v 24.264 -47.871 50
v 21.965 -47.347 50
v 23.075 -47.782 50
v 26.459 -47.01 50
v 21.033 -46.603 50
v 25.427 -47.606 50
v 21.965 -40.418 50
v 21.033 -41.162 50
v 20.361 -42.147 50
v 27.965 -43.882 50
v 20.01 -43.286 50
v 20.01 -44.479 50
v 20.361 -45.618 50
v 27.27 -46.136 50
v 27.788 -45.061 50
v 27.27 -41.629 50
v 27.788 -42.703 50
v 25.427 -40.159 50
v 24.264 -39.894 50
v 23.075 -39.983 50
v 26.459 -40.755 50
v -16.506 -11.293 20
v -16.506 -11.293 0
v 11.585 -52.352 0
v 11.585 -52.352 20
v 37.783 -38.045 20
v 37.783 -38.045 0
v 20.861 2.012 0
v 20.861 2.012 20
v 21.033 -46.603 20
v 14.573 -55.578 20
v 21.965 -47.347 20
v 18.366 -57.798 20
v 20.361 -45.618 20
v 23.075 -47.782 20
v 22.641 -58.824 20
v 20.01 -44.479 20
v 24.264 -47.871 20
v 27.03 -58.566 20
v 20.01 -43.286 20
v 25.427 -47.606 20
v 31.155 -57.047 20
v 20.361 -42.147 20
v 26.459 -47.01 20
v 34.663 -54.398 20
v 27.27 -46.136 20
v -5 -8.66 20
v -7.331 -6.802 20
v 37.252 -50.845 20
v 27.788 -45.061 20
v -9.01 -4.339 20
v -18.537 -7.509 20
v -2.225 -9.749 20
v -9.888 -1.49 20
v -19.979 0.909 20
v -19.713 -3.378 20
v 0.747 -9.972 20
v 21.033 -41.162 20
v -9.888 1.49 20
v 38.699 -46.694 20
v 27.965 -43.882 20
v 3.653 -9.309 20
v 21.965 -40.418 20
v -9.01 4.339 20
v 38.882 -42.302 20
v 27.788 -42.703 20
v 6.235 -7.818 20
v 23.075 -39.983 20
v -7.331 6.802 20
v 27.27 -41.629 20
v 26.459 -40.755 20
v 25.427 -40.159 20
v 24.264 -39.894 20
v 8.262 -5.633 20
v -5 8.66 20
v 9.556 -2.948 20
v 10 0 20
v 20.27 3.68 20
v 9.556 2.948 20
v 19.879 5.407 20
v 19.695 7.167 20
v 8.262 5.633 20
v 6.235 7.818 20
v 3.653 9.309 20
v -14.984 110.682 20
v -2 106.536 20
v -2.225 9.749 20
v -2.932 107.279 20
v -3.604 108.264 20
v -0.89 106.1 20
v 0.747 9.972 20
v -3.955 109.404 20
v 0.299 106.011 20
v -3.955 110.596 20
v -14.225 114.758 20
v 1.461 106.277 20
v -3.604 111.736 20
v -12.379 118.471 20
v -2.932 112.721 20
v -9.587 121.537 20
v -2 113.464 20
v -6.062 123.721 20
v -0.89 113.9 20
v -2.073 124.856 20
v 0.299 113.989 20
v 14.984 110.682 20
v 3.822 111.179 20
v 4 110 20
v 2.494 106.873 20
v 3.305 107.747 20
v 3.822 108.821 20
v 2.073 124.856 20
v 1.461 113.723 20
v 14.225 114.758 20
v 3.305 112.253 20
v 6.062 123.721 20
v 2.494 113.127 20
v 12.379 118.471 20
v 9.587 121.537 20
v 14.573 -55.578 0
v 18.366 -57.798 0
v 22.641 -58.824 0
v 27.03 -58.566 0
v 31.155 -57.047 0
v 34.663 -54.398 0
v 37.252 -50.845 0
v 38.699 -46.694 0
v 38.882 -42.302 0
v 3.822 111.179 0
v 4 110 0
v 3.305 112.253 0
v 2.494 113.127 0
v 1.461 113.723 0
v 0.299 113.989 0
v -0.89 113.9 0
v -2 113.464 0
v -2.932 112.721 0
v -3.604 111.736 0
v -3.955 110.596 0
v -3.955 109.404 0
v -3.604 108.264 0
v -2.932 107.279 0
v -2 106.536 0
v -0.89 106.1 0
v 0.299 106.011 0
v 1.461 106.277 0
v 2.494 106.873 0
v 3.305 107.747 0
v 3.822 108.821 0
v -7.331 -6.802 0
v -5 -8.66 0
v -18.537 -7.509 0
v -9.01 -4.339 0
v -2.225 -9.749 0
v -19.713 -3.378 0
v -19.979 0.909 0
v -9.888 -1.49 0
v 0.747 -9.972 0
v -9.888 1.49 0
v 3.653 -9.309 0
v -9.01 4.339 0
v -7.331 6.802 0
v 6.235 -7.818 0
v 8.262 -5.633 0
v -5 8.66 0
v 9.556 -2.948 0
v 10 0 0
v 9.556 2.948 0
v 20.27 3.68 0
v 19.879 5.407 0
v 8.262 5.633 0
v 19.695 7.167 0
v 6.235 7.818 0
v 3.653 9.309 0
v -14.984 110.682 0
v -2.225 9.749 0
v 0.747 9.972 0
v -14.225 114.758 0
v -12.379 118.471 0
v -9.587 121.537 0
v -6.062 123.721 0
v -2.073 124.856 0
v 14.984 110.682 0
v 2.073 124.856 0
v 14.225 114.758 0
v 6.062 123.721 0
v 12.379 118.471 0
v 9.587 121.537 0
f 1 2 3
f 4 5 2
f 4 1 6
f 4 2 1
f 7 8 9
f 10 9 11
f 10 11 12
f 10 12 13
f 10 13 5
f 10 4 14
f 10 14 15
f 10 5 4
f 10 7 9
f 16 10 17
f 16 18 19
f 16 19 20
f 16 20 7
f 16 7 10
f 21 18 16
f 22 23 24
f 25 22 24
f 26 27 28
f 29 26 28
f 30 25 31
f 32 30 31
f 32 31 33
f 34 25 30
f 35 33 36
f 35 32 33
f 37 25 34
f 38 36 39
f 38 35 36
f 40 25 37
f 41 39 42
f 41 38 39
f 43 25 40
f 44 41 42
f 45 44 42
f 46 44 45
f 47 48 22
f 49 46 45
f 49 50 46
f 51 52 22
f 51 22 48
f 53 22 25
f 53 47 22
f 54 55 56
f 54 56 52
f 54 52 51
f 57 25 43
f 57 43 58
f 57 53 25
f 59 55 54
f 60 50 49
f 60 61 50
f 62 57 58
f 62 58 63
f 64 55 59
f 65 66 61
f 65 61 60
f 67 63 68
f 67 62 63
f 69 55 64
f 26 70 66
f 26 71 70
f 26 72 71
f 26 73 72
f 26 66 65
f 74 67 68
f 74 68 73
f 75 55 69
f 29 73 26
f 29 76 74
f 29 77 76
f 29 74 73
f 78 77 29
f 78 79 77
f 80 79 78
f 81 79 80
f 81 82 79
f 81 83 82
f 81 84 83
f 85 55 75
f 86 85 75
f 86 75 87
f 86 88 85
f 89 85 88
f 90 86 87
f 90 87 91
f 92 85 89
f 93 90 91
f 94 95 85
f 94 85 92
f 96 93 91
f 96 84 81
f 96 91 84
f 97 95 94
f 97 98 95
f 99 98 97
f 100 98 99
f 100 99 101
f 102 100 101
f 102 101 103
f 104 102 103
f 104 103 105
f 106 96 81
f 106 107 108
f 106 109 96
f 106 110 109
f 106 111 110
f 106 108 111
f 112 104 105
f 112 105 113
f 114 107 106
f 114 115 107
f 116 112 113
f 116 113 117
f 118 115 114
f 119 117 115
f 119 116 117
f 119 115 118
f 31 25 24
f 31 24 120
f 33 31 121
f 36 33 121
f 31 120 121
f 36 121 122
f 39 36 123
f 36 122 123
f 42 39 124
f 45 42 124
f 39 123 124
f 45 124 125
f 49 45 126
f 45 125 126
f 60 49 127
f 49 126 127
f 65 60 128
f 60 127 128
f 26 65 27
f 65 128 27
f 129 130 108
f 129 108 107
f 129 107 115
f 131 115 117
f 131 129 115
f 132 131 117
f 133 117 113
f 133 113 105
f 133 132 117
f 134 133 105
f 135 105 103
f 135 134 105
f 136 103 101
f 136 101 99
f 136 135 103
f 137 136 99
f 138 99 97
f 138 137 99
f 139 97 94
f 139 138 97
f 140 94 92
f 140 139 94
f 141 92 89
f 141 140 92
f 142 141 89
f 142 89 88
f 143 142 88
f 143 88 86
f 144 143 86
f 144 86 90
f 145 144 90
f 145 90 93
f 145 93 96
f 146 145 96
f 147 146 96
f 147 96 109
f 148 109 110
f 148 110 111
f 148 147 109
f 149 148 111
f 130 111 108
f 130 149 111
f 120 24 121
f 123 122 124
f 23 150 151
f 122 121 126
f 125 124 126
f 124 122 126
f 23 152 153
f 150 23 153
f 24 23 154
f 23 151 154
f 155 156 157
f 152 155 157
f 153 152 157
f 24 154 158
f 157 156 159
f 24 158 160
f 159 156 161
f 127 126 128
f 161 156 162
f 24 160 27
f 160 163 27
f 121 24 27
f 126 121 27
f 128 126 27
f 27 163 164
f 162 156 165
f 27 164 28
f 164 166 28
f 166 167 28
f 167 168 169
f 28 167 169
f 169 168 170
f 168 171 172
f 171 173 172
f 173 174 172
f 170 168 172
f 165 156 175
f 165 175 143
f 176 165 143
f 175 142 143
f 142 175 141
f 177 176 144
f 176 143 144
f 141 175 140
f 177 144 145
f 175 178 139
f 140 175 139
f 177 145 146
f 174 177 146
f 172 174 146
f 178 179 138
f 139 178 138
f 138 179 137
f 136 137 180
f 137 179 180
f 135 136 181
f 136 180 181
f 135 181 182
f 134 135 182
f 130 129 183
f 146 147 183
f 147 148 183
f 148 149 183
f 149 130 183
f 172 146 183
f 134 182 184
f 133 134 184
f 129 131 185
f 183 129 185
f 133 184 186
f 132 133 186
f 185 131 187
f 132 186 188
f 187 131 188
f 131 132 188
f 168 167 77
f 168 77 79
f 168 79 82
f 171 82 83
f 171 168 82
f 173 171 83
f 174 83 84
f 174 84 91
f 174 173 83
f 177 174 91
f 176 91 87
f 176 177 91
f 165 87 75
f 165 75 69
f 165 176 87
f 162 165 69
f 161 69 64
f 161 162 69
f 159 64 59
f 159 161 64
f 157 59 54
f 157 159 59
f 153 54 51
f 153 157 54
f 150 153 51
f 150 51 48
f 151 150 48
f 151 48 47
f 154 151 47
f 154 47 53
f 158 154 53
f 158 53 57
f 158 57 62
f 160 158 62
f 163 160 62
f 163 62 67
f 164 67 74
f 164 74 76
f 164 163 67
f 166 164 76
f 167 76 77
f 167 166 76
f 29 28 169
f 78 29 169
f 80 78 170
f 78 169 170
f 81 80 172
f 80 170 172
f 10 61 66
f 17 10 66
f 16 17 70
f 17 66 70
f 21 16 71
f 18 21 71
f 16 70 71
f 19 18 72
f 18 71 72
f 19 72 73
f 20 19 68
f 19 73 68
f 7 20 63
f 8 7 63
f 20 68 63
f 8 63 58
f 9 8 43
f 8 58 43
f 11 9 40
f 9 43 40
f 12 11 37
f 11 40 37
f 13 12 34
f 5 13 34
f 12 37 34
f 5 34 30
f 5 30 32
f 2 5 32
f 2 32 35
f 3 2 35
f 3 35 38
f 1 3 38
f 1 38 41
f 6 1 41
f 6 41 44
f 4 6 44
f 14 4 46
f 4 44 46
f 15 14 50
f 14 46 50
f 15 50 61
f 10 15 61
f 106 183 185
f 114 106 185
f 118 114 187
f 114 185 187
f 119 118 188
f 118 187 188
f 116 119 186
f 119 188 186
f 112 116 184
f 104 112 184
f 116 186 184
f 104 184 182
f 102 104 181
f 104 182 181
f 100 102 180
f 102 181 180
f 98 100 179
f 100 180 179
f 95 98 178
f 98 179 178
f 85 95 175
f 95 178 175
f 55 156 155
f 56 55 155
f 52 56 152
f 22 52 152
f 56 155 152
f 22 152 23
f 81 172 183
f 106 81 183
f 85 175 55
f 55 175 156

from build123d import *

# Parameters (mm, degrees)
SKETCH_1_R      = 10
SKETCH_1_R_2    = 4
EXTRUDE_1_DEPTH = 20
SKETCH_2_R      = 4
EXTRUDE_2_DEPTH = 30


with BuildPart() as part:
    # 草图1 → 凸台-拉伸1 (new body)
    with BuildSketch(Plane.XY):
        with BuildLine():
            Line((-14.98449612, 110.681818182), (-19.97932816, 0.909090909))
            ThreePointArc((-19.97932816, 0.909090909), (-19.236072743, -5.474806428), (-16.506376679, -11.293340025))
            Line((-16.506376679, -11.293340025), (11.58545194, -52.352433595))
            ThreePointArc((11.58545194, -52.352433595), (31.154804784, -57.04715715), (37.782931026, -38.045369273))
            Line((37.782931026, -38.045369273), (20.861374384, 2.011947794))
            ThreePointArc((20.861374384, 2.011947794), (20.049111843, 4.537769231), (19.694574841, 7.167188916))
            Line((19.694574841, 7.167188916), (14.98449612, 110.681818182))
            ThreePointArc((14.98449612, 110.681818182), (0, 125), (-14.98449612, 110.681818182))
        make_face()
        Circle(SKETCH_1_R, mode=Mode.SUBTRACT)
        with Locations((0, 110)):
            Circle(SKETCH_1_R_2, mode=Mode.SUBTRACT)
    extrude(amount=EXTRUDE_1_DEPTH)

    # 草图2 → 凸台-拉伸2 (add)
    with BuildSketch(Plane.XY.offset(20)):
        with Locations((23.965234449, -43.882428577)):
            Circle(SKETCH_2_R)
    extrude(amount=EXTRUDE_2_DEPTH)


solid = part.part
